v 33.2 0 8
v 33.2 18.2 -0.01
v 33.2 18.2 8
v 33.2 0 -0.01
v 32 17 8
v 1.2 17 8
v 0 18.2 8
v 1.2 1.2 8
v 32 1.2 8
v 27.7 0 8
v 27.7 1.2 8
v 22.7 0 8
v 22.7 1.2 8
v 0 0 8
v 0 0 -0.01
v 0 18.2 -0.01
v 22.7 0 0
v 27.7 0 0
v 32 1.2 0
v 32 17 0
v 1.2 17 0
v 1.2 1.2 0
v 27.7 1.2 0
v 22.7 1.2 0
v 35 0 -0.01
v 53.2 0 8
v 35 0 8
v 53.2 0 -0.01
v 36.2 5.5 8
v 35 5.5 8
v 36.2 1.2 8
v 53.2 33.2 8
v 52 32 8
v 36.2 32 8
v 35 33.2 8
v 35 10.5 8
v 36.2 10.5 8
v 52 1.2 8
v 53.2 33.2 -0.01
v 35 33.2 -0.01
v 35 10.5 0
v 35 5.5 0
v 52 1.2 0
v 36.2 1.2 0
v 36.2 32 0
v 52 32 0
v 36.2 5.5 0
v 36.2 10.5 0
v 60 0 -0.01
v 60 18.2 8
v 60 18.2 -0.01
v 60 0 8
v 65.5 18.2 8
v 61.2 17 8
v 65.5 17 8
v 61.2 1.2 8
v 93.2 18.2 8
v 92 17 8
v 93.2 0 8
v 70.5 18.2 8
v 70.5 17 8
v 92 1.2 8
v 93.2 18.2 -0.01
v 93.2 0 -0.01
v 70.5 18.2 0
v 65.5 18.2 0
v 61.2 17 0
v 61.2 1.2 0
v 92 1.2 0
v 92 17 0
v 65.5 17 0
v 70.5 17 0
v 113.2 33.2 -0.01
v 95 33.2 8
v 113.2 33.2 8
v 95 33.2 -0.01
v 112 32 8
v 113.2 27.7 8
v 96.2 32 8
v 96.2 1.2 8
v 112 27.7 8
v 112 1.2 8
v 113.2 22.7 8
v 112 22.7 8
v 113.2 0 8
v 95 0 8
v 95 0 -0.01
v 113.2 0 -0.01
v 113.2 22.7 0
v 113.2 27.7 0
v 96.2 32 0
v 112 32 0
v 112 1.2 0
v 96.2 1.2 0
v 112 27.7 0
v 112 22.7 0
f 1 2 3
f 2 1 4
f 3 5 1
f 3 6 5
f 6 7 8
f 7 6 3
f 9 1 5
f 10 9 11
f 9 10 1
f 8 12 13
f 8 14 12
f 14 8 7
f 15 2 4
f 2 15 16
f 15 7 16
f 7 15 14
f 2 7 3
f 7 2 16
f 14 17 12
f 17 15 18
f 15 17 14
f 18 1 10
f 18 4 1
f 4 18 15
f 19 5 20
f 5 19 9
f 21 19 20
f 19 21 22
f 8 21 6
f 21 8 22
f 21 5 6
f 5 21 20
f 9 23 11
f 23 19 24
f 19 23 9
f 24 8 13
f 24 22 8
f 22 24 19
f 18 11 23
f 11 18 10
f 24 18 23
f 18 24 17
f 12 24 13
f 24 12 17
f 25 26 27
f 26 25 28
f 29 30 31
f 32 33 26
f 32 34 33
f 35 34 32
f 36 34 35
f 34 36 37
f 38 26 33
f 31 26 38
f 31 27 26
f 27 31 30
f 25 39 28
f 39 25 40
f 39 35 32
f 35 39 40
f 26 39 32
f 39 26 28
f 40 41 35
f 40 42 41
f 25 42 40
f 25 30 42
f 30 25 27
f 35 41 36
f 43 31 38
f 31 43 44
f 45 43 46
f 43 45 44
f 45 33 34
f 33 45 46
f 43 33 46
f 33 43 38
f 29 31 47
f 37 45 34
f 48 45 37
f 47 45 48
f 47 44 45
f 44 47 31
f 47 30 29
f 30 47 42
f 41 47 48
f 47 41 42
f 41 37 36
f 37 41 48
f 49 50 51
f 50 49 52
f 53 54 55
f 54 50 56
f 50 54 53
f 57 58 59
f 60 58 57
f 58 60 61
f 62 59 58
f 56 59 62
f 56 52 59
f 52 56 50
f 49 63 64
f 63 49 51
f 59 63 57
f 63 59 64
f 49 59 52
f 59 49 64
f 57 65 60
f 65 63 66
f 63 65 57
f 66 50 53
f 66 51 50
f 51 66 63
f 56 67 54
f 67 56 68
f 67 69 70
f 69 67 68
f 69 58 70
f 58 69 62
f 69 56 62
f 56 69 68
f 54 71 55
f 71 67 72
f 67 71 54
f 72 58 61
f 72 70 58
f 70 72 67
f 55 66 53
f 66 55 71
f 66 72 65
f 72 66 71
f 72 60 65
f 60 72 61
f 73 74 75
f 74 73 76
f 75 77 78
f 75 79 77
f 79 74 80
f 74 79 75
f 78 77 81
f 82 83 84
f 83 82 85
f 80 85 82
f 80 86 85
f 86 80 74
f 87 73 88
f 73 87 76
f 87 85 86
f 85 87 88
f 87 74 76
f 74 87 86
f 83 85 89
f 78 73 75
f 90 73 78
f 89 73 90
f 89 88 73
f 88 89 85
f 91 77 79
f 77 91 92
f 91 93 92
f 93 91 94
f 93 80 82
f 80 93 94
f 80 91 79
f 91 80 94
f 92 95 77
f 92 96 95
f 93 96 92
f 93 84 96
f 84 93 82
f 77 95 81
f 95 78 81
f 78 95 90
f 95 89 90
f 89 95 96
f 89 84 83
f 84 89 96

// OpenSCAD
// file: ../../Base/Boxes.scad
// Fischertechnik Box Foundation
// Pre-designed Boxes

use <Constants.scad>

include <PlacementOptions.scad>

box190Width = 190;
box190Depth = 130;
box130Width = 130;
box130Depth = 95;
boxUsageHeight = 33.9;
boxWallThickness = 2.4;
boxBaseThickness = 1.0;

// getBoxWallThickness()
// Gets the wall thickness of a Fischertechnik Box

function getBoxWallThickness() = boxWallThickness;

// Gets the usable height of a fischertechnik box
function getBoxUsageHeight() = boxUsageHeight;

// Gets the thickness of the Fischertechnik box base.
function getBoxBaseThickness() = boxBaseThickness;

// Gets the usable inner space of a Box 190 as an x/y-list
function getBox190Space() = [
    box190Width - 2*getBoxWallThickness(), 
    box190Depth - 2*getBoxWallThickness() ];

// Imports the Fischertechnik empty box 130x190 mm and places it at position 0,0
// 190x130 are the outer sizes, the inner space is slightly smaller. Use getBox190Space() to get the inner sizes.
// This module needs the STL file "Fischertechnik Box 130x190.stl" in the library path.
// The box is positioned that the usable inner space is at the 0,0,0 position. The

module Box190() {
    translate([-getBoxWallThickness(),-getBoxWallThickness(),-getBoxBaseThickness()])
        import("Fischertechnik Box 130x190.stl", convexity=3);
}

// Gets the usable inner space of a Box 130 as an x/y-list
function getBox130Space() = [
    box130Width - 2*getBoxWallThickness(), 
    box130Depth - 2*getBoxWallThickness() ];

// Imports the Fischertechnik empty box 95x130 mm and places it at position 0,0
// 190x130 are the outer sizes, the inner space is slightly smaller. Use getBox190Space() to get the inner sizes.
// This module needs the STL file "Fischertechnik Box 95x130.stl" in the library path.
// The box is positioned that the usable inner space is at the 0,0,0 position. The

module Box130() {
    translate([-getBoxWallThickness(),-getBoxWallThickness(),-getBoxBaseThickness()])
        import("Fischertechnik Box 95x130.stl", convexity=3);
}

// Creates a web at the specified box walls
// corner 0 = LowerLeft, 1 = UpperLeft, 2 = UpperRight, 3 = LowerRight
// side 0 = LeftOfCorner, 1 = RightOfCorner
// distance = Distance in mm from the corner
// box = inner width and depth of the box (default: Box 190)
// webWidth = length of the web (default is 3 mms)
// webThickness = thickness of the web (default is 1 mm)

module BoxWeb(corner, side, distance, box=getBox190Space(), webWidth=3, webThickness=1.0) {
    sink = getBoxWallThickness()/2;

    width = (corner % 2 == 0) ? 
            (side == LeftOfCorner ? webWidth : webThickness) :
            (side == LeftOfCorner ? webThickness : webWidth);

    depth = (corner % 2 == 0) ? 
            (side == RightOfCorner ? webWidth : webThickness) :
            (side == RightOfCorner ? webThickness : webWidth);
    
    xDiff = corner == LowerLeft ? 
                (side == LeftOfCorner ? -sink : distance) :
            (corner == UpperLeft ?                
                (side == LeftOfCorner ? distance : -sink) :
            (corner == UpperRight ?
                (side == LeftOfCorner ? box.x-webWidth+sink : box.x-distance-webThickness) :
                (side == LeftOfCorner ? box.x-distance-webThickness: box.x-webWidth+sink)));

    yDiff = corner == LowerLeft ? 
                (side == RightOfCorner ? -sink : distance) :
            (corner == UpperLeft ?
                (side == RightOfCorner ? box.y-distance : box.y-webWidth+sink) :
            (corner == UpperRight ?
                (side == RightOfCorner ? box.y-webWidth+sink : box.y-distance) :
                (side == RightOfCorner ? distance : -sink)));
    
    translate([xDiff, yDiff, -getExcess()])
        cube([width, depth, boxUsageHeight + 2*getExcess()]);
}
// file: ../../Base/Rotation.scad
// Fischertechnik Box Foundation
// Geometry Helpers Rotation

include <PlacementOptions.scad>

// getRotatedSpace(space, rotation=NoRotation)
// Rotates the space dependent on the specified rotation

function getRotatedSpace(space, rotation=NoRotation) = [
    (rotation == Rotate90 || rotation == Rotate270) ? space.y : space.x,
    (rotation == Rotate90 || rotation == Rotate270) ? space.x : space.y
];

// Rotates the given space around the fixed left lower corner
// space = the space the children needs as width/depth list [width,depth]
// rotation = 0 Rotate0 degrees, 1 Rotate90 degrees, 2 Rotate180 degrees, 3 Rotate270 degrees (equivalent to -90)

module RotateFix(space, rotation=Rotate0) {
    dy = (rotation == Rotate0 || rotation == Rotate270) ? 0 :
        (rotation == Rotate90) ? space.x :
        space.y;
    dx = (rotation < Rotate180) ? 0 :
        (rotation == Rotate180) ? space.x :
        space.y;
    
    translate([dx, dy, 0])
        rotate([0, 0, rotations[rotation]])
            children();
}
// file: ../../Base/Alignment.scad
// Fischertechnik Box Foundation
// Geometry Helpers Alignment

include <PlacementOptions.scad>

// getAlignedX(elementWidth, spaceWidth, align=AlignRight, offset=0)
// Gets the aligned X offset of an element with the given
// width in the given space.
// elementWidth = The width of the element to positon
// spaceWidth = The space where the element should be aligned
// align = 0 AlignLeft, 1 AlignCenter, 2 AlignRight
// offset = an optional offset from the aligned position. When
// aligned left or centered, then positive values are in X direction.
// When aligned right then positive values are in negative X direction.

function getAlignedX(elementWidth, spaceWidth, align=AlignRight, offset=0) =
    (align == AlignLeft) ?
        offset :
        ((align == AlignCenter) ?
        (spaceWidth - elementWidth)/2 + offset :
        spaceWidth - offset - elementWidth);

// getAlignedY(elementDepth, spaceDepth, align=AlignTop, offset=0)
// Gets the aligned Y offset of an element with the given
// depth in the given space.
// elementDepth = The depth of the element to positon
// spaceDepth = The space where the element should be aligned
// align = 0 AlignBottom, 1 AlignCenter, 2 AlignTop
// offset = an optional offset from the aligned position. When
// aligned bottom or centered, then positive values are in Y direction.
// When aligned top then positive values are in negative Y direction.

function getAlignedY(elementDepth, spaceDepth, align=AlignTop, offset=0) =
    (align == AlignBottom) ?
        offset :
        ((align == AlignCenter) ?
        (spaceDepth - elementDepth)/2 + offset :
        spaceDepth - offset - elementDepth);
// file: ../../Base/Constants.scad
// Fischertechnik Box Foundation
// Constants

// Constant values necessary for multiple elements

// Base constants
dividerThickness = 1.2;
excess = 0.01;
fragments = 90;
tolerance = 0.8;

// Gets the thickness of a divider 
function getDividerThickness() = dividerThickness;

// Gets the excess that is used to merge walls into each other
function getExcess() = excess;

// Gets amount of fragments of a cylinder
function getFragments() = fragments;

// Gets the inner tolerance of a frame to each side
function getTolerance() = tolerance;


// Fischertechnik specific constants
axisDiameter = 4;
axisBottomDiameter = axisDiameter + 1;
standardEdgeDistance = 2.5;
standardWebDistance = 11.5;
standardCornerLength = 15;
tubeWallFactor = 1.6;

// Gets axis diameter
function getAxisDiameter() = axisDiameter;

// Gets axis bottom diameter for thicker part at the bottom
function getAxisBottomDiameter() = axisBottomDiameter;

// gets the standard distance to the wall of the box for dockable frames with webs
function getStandardEdgeDistance() = standardEdgeDistance;

// gets the standard distance of each web to the corner of the dockable frame
function getStandardWebDistance() = standardWebDistance;

// gets the standard length of the corner walls of a dockable frame
function getStandardCornerLength() = standardCornerLength;

// gets the wall thickness of a tube.
function getTubeWallThickness() = tubeWallFactor * getDividerThickness();
// file: ../../Base/PlacementOptions.scad
// Fischertechnik Box Foundation
// Placement Options

// Alignment
NoAlign = 0;
AlignLeft = 1;
AlignBottom = 2;
AlignCenter = 3;
AlignRight = 4;
AlignTop = 5;

// Element rotation degree steps
rotations = [0, -90, -180, -270];

// Rotation
NoRotation = 0;
Rotate0 = 0;
Rotate90 = 1;
Rotate180 = 2;
Rotate270 = 3;

// Docking (seen from above)
NoDock = -1;
DockLeft = 0;
DockTop = 1;
DockRight = 2;
DockCorner = 2;
DockBottom = 3;

// Web corners
LowerLeft = 0;
UpperLeft = 1;
UpperRight = 2;
LowerRight = 3;

// Web position relative to corner
LeftOfCorner = 0;
RightOfCorner = 1;
// file: ../../Elements/FrameLightTube.scad
// Fischertechnik Box Library
// Frame for Light Tube
// 31363

use <../Base/Constants.scad>
use <../ModelBase/Simple.scad>

width = 30;
depth = 15;
height = 8;

// getFrameLightTubeSpace()
// Gets the space the frame for light tube needs as width (.x and .y as a list)

function getFrameLightTubeSpace() = getFrameOuterVolume([width, depth, height]);

// FrameLightTube()
// Frame for light tube

module FrameLightTube() {
    gapWidth = 5;
    gapDistance = 3.5;
    
    difference() {
        Frame([width, depth, height]);
        translate([width-gapDistance-gapWidth+getDividerThickness(),-getDividerThickness()/2,0])
            cube([gapWidth, getDividerThickness()*2, height + 1]);
    }
}

// Test
color("lightgray") {
    FrameLightTube();
}
// file: ../../Base/Placement.scad
// Fischertechnik Box Foundation
// Geometry Helpers Placement

use <Constants.scad>
use <Alignment.scad>
use <Rotation.scad>
use <Boxes.scad>

include <PlacementOptions.scad>

// Place(x=0, y=0, elementSpace=[0,0], alignX=AlignLeft, alignY=AlignBottom, rotation=Rotate0, boxSpace=getBox190Space())
// Places the child at the specified position
// y = Y-Position. This is a relative position when an X aligment is specified.
// x = X-Position. This is a relative position when an Y aligment is specified.
// elementSpace = space of the element to be placed [x,y]
// alignX = -1=NoAlign, 0 AlignLeft, 1 AlignCenter, 3 AlignRight (elementSpace and boxSpace required!)
// alignY = -1=NoAlign, 2 AlignBottom, 1 AlignCenter, 4 AlignTop (elementSpace and boxSpace required!)
// rotation = 0 Rotate0 0 degrees, 1 Rotate90 90 degrees, 
// 2 Rotate180 180 degrees, 3 Rotate270 270 degrees (equivalent to -90)
// boxSpace = Inner space of the box where the placement occurs [x,y] - default is Box 190x130 inner space

module Place(x=0, y=0, elementSpace=[0,0], 
  alignX=AlignLeft, alignY=AlignBottom, 
  rotation=NoRotation, boxSpace=getBox190Space()) {

    module Position(x, y, space, rotation=Rotate0) {
        translate([x, y, 0])
            RotateFix(space, rotation)
                children(0);
    }

    space = getRotatedSpace(elementSpace, rotation);
    alignedX = getAlignedX(space.x, boxSpace.x, alignX, x);
    alignedY = getAlignedY(space.y, boxSpace.y, alignY, y);
    Position(alignedX, alignedY, elementSpace, rotation)
        children(0);
}

// Center(space=getBox130Space(), elementSpace=[0,0])
// space = Space where the children is centered. For cylinder use centered=true and no elementSpace.
// elementSpace = space of the element to be centered [x,y]

module Center(space=getBox190Space(), elementSpace=[0,0]) {
    translate([(space.x - elementSpace.x) / 2, (space.y - elementSpace.y) / 2])
        children(0);
}

// CenterHorizontal(width=0, y=0, offset=0, space=getBox130Space())
// space = Space where the children is centered. For cylinder use centered=true and no elementSpace.
// elementSpace = space of the element to be centered [x,y]

module CenterHorizontal(width=0, y=0, offset=0, space=getBox190Space()) {
    translate([(space.x - width) / 2 + offset, y])
        children(0);
}

// CenterVertical(depth=0, x=0, offset=0, space=getBox130Space())
// space = Space where the children is centered. For cylinder use centered=true and no elementSpace.
// elementSpace = space of the element to be centered [x,y]

module CenterVerticalal(depth=0, x=0, offset=0, space=getBox190Space()) {
    translate([x, (space.y - depth) / 2 + offset])
        children(0);
}
// main file
// Fischertechnik Box Foundation
// Elements
// Test FrameLightTube

use <../../Base/Placement.scad>
use <../../Elements/FrameLightTube.scad>

include <../../Base/PlacementOptions.scad>

FrameLightTube();

Place(35, 0, getFrameLightTubeSpace(), rotation=Rotate90)
    FrameLightTube();

Place(60, 0, getFrameLightTubeSpace(), rotation=Rotate180)
    FrameLightTube();

Place(95, 0, getFrameLightTubeSpace(), rotation=Rotate270)
    FrameLightTube();
